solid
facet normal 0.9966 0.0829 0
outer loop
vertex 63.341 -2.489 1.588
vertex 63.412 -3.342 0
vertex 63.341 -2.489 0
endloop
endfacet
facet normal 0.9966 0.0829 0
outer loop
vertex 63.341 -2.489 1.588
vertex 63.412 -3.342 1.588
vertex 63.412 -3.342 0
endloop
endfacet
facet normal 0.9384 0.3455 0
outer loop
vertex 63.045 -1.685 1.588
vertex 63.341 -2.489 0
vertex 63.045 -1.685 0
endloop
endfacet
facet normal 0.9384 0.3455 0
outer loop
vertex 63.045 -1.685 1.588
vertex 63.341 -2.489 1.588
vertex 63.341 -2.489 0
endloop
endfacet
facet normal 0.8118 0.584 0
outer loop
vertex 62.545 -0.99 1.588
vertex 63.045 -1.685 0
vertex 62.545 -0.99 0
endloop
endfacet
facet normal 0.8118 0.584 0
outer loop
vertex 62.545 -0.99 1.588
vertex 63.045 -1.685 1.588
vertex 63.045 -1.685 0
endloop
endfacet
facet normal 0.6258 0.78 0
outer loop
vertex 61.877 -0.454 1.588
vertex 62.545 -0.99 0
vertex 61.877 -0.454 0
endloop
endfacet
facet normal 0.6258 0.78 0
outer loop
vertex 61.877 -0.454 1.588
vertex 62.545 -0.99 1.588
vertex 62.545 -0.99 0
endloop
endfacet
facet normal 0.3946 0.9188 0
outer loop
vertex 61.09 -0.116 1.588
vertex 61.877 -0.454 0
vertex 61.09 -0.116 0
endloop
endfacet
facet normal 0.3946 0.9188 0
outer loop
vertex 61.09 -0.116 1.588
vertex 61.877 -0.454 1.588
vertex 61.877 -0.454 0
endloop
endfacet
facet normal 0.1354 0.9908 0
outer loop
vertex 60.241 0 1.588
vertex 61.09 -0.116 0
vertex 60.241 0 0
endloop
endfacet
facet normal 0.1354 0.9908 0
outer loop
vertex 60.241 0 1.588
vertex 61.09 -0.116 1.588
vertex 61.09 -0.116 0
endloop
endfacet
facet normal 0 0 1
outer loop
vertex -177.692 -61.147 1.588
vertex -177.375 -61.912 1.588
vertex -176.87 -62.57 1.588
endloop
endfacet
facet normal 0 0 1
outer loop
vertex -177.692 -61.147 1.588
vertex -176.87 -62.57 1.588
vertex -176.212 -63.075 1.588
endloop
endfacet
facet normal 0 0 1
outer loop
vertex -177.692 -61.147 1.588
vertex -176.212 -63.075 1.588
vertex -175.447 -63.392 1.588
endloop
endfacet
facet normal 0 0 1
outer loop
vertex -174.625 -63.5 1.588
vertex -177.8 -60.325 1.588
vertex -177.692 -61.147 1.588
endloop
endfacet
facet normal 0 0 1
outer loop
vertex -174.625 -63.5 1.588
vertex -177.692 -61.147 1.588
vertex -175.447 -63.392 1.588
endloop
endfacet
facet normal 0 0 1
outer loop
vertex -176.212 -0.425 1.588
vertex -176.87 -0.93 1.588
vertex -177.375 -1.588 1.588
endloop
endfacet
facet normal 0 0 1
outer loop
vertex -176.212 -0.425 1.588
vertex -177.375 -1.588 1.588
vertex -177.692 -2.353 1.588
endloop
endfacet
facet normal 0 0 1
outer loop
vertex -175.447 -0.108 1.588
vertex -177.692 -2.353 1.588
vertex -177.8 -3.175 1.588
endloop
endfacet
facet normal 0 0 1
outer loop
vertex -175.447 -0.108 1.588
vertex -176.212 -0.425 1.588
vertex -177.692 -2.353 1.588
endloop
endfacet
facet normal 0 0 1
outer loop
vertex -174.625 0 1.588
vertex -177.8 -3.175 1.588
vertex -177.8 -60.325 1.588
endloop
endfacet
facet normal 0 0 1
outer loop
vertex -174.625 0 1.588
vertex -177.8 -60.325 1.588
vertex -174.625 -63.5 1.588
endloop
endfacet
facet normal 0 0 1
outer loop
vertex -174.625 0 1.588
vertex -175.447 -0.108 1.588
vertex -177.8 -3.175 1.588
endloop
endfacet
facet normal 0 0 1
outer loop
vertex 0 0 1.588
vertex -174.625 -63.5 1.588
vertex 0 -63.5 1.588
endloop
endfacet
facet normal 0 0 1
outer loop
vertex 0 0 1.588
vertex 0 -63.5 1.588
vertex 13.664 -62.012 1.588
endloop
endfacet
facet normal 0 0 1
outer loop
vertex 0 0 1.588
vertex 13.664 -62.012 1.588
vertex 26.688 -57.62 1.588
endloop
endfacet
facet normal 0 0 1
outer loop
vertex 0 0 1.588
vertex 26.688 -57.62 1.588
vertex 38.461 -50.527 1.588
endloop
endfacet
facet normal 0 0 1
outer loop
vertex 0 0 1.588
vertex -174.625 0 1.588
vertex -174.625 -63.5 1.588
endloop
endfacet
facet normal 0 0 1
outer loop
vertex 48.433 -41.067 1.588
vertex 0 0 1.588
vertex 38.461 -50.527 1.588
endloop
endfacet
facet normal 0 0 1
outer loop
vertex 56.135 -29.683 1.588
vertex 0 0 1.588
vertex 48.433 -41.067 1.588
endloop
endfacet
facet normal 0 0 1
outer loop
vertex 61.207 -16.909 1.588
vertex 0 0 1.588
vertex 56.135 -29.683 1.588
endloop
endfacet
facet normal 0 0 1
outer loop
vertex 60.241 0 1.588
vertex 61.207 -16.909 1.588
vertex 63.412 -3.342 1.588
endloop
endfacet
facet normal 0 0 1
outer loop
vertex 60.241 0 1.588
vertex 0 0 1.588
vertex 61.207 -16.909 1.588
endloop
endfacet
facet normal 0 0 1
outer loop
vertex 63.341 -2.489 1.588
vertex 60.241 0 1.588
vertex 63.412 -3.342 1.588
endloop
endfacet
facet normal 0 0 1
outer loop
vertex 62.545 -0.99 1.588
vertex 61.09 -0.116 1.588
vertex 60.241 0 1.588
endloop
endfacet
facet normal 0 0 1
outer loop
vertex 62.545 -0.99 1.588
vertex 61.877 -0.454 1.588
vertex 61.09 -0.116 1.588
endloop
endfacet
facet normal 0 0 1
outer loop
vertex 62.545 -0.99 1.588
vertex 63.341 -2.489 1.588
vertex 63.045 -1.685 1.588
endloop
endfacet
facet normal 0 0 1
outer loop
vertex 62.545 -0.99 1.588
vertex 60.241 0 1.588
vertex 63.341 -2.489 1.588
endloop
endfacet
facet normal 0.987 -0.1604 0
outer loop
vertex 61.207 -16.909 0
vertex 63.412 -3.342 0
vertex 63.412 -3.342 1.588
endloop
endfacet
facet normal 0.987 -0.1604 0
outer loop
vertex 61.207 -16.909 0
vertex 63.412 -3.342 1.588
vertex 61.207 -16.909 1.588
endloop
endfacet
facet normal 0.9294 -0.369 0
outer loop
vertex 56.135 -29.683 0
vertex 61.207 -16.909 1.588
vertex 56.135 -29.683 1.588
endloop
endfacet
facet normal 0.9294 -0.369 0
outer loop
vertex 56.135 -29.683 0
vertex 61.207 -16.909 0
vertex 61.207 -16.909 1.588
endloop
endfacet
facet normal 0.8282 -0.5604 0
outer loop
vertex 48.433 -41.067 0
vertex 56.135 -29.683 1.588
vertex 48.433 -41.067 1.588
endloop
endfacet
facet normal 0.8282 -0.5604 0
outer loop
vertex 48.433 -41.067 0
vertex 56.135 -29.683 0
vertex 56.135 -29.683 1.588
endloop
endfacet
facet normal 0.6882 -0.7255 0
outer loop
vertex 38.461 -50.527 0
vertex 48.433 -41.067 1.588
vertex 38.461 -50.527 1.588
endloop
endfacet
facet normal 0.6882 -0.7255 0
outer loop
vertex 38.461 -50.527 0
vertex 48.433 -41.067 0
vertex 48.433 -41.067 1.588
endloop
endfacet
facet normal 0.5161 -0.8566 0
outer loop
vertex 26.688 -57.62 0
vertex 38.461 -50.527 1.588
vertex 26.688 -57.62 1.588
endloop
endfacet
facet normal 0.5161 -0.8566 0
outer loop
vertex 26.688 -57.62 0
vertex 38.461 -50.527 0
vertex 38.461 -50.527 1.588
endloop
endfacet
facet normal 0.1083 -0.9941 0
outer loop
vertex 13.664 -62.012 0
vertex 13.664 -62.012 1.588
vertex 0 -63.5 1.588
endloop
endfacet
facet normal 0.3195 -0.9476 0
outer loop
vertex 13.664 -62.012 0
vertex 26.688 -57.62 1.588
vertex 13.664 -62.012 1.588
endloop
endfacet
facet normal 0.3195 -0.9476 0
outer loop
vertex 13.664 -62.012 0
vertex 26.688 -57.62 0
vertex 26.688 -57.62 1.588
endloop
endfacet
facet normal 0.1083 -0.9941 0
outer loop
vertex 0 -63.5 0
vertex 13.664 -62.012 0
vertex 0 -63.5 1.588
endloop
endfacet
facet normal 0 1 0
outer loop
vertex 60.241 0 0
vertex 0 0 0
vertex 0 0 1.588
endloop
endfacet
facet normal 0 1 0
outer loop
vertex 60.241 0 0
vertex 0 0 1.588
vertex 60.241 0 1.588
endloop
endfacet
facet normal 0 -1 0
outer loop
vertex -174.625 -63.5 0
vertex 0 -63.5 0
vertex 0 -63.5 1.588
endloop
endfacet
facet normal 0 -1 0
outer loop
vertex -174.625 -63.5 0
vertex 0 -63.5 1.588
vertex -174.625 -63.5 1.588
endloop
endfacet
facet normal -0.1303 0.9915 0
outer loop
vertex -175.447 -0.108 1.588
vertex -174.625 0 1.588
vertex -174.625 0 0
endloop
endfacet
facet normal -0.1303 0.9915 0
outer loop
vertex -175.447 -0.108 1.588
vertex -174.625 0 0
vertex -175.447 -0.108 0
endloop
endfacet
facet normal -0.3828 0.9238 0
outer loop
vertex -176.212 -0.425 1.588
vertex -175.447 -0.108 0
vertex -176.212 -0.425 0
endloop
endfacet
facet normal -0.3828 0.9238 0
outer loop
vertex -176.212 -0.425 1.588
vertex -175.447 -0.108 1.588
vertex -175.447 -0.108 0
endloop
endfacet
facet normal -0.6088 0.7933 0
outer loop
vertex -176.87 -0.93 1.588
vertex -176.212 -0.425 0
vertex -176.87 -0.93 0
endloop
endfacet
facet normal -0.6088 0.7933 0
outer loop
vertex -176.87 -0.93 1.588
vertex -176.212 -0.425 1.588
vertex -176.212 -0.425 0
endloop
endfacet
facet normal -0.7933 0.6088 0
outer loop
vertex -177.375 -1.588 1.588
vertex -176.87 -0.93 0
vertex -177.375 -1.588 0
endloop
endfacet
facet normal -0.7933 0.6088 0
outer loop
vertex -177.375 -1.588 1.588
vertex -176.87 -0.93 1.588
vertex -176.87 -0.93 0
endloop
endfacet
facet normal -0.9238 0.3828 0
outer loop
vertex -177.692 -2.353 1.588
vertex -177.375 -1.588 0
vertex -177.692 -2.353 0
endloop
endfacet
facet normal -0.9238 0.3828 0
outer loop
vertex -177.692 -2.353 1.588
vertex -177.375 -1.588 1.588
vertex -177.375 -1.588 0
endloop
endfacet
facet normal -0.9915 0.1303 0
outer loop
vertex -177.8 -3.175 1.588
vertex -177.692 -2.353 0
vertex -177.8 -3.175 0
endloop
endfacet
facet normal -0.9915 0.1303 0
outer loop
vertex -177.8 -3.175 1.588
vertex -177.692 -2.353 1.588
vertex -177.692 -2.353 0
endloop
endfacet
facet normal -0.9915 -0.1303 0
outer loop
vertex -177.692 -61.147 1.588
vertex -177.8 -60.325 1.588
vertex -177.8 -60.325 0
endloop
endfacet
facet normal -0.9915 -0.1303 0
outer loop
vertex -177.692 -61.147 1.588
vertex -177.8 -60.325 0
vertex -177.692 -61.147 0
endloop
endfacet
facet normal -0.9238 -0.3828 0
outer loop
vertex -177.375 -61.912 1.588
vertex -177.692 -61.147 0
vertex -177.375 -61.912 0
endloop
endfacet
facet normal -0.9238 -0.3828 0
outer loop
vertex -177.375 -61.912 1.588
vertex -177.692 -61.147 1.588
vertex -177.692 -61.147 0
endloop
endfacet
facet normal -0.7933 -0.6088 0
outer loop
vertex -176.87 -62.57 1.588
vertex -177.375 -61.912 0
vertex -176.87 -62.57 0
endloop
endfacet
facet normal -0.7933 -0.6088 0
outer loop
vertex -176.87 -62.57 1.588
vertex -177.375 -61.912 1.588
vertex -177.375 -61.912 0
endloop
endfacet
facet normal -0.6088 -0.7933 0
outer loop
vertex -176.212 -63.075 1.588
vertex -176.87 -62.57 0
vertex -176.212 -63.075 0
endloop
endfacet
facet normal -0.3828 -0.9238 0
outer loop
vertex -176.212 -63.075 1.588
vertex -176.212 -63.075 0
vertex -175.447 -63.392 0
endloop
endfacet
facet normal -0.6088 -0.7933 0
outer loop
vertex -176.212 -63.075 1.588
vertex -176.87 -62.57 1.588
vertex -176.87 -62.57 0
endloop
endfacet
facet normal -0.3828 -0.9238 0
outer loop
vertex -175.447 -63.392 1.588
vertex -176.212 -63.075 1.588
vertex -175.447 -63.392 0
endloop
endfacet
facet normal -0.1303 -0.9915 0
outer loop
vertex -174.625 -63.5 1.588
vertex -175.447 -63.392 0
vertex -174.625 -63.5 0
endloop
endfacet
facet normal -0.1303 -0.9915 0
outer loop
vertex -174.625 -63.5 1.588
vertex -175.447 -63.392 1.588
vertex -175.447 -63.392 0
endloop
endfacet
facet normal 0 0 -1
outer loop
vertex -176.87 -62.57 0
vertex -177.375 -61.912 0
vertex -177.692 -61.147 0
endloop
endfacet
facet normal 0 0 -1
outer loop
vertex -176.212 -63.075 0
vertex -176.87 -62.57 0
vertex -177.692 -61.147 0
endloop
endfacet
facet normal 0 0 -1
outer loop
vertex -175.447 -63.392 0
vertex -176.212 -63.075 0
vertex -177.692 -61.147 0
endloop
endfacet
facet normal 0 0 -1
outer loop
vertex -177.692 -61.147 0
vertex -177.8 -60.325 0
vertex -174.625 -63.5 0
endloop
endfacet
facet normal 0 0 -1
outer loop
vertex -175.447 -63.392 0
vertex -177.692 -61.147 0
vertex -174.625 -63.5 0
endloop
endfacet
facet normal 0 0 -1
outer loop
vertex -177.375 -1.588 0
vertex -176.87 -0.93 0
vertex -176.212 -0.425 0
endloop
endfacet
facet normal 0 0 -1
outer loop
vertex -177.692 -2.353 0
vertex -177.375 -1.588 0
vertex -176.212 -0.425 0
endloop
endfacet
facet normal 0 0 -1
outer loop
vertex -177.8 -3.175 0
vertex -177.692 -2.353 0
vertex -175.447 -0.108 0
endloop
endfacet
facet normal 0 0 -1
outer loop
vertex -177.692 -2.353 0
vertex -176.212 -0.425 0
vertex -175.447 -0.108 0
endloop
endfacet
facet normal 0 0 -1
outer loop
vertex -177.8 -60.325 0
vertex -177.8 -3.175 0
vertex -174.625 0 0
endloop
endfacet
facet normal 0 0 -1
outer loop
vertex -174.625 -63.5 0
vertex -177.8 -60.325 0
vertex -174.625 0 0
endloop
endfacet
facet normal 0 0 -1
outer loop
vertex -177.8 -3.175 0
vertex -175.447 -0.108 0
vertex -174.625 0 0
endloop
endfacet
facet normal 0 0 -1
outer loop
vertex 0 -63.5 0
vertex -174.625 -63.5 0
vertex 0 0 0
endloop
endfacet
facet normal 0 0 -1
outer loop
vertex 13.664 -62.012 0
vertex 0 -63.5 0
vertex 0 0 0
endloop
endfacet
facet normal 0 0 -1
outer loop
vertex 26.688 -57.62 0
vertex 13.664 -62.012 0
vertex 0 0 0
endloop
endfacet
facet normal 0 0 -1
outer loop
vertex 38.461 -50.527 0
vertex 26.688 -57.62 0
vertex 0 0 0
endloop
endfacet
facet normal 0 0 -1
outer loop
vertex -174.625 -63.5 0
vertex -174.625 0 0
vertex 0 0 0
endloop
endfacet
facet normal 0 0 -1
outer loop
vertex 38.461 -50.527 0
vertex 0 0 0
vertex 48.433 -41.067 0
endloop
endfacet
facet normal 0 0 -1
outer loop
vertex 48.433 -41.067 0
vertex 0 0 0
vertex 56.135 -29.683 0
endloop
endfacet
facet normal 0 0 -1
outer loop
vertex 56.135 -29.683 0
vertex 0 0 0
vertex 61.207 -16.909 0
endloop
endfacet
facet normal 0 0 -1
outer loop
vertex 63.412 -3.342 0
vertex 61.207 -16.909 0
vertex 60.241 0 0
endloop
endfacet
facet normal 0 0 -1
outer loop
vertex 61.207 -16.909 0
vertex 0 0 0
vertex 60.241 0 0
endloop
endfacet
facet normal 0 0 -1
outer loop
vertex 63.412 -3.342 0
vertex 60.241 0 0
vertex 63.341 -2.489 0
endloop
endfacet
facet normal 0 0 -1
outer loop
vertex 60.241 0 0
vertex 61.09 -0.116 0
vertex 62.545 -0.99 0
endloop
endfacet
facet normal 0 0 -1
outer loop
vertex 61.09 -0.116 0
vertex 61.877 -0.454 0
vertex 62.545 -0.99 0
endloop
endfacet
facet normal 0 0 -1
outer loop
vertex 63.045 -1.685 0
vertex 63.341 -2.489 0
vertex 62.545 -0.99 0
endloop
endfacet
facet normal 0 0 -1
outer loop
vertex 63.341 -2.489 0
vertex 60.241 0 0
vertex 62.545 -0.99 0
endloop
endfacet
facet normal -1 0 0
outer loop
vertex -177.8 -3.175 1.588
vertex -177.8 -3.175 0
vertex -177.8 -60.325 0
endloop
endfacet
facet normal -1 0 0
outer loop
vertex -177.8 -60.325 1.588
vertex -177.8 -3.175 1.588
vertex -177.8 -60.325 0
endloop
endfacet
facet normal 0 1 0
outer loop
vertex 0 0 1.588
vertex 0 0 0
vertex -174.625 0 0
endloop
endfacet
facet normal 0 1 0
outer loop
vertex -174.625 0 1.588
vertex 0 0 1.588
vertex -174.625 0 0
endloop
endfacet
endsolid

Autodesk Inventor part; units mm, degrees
ref_plane "YZ Plane" through (0, 0, 0) normal (1, 0, 0) x (0, 1, 0)
ref_plane "XZ Plane" through (0, 0, 0) normal (0, 1, 0) x (-1, 0, 0)
ref_plane "XY Plane" through (0, 0, 0) normal (0, 0, 1) x (1, 0, 0)
sketch "Sketch1" plane through (0, 0, 0) normal (0, 0, 1) x (1, 0, 0)
  arc A0 (0, -63.5) -> (63.5, 0) centre (0, 0) ccw
  line L0 (0, 0) -> (-177.8, 0)
  line L1 (0, -63.5) -> (-177.8, -63.5)
  line L2 (-177.8, 0) -> (-177.8, -63.5)
  line L3 (0, 0) -> (63.5, 0)
  dimension "d0" = 127
  dimension "d1" = 177.8
  dimension "d2" = 177.8
extrude "Extrusion1" add sketch "Sketch1" along normal blind 1.5875
fillet "Fillet1" radius 3.175 1 edges at (63.5, 0, 0.7937)
fillet "Fillet2" radius 3.175 1 edges at (-177.8, 0, 0.7937)
fillet "Fillet3" radius 3.175 1 edges at (-177.8, -63.5, 0.7937)
properties part number "Flaps"
